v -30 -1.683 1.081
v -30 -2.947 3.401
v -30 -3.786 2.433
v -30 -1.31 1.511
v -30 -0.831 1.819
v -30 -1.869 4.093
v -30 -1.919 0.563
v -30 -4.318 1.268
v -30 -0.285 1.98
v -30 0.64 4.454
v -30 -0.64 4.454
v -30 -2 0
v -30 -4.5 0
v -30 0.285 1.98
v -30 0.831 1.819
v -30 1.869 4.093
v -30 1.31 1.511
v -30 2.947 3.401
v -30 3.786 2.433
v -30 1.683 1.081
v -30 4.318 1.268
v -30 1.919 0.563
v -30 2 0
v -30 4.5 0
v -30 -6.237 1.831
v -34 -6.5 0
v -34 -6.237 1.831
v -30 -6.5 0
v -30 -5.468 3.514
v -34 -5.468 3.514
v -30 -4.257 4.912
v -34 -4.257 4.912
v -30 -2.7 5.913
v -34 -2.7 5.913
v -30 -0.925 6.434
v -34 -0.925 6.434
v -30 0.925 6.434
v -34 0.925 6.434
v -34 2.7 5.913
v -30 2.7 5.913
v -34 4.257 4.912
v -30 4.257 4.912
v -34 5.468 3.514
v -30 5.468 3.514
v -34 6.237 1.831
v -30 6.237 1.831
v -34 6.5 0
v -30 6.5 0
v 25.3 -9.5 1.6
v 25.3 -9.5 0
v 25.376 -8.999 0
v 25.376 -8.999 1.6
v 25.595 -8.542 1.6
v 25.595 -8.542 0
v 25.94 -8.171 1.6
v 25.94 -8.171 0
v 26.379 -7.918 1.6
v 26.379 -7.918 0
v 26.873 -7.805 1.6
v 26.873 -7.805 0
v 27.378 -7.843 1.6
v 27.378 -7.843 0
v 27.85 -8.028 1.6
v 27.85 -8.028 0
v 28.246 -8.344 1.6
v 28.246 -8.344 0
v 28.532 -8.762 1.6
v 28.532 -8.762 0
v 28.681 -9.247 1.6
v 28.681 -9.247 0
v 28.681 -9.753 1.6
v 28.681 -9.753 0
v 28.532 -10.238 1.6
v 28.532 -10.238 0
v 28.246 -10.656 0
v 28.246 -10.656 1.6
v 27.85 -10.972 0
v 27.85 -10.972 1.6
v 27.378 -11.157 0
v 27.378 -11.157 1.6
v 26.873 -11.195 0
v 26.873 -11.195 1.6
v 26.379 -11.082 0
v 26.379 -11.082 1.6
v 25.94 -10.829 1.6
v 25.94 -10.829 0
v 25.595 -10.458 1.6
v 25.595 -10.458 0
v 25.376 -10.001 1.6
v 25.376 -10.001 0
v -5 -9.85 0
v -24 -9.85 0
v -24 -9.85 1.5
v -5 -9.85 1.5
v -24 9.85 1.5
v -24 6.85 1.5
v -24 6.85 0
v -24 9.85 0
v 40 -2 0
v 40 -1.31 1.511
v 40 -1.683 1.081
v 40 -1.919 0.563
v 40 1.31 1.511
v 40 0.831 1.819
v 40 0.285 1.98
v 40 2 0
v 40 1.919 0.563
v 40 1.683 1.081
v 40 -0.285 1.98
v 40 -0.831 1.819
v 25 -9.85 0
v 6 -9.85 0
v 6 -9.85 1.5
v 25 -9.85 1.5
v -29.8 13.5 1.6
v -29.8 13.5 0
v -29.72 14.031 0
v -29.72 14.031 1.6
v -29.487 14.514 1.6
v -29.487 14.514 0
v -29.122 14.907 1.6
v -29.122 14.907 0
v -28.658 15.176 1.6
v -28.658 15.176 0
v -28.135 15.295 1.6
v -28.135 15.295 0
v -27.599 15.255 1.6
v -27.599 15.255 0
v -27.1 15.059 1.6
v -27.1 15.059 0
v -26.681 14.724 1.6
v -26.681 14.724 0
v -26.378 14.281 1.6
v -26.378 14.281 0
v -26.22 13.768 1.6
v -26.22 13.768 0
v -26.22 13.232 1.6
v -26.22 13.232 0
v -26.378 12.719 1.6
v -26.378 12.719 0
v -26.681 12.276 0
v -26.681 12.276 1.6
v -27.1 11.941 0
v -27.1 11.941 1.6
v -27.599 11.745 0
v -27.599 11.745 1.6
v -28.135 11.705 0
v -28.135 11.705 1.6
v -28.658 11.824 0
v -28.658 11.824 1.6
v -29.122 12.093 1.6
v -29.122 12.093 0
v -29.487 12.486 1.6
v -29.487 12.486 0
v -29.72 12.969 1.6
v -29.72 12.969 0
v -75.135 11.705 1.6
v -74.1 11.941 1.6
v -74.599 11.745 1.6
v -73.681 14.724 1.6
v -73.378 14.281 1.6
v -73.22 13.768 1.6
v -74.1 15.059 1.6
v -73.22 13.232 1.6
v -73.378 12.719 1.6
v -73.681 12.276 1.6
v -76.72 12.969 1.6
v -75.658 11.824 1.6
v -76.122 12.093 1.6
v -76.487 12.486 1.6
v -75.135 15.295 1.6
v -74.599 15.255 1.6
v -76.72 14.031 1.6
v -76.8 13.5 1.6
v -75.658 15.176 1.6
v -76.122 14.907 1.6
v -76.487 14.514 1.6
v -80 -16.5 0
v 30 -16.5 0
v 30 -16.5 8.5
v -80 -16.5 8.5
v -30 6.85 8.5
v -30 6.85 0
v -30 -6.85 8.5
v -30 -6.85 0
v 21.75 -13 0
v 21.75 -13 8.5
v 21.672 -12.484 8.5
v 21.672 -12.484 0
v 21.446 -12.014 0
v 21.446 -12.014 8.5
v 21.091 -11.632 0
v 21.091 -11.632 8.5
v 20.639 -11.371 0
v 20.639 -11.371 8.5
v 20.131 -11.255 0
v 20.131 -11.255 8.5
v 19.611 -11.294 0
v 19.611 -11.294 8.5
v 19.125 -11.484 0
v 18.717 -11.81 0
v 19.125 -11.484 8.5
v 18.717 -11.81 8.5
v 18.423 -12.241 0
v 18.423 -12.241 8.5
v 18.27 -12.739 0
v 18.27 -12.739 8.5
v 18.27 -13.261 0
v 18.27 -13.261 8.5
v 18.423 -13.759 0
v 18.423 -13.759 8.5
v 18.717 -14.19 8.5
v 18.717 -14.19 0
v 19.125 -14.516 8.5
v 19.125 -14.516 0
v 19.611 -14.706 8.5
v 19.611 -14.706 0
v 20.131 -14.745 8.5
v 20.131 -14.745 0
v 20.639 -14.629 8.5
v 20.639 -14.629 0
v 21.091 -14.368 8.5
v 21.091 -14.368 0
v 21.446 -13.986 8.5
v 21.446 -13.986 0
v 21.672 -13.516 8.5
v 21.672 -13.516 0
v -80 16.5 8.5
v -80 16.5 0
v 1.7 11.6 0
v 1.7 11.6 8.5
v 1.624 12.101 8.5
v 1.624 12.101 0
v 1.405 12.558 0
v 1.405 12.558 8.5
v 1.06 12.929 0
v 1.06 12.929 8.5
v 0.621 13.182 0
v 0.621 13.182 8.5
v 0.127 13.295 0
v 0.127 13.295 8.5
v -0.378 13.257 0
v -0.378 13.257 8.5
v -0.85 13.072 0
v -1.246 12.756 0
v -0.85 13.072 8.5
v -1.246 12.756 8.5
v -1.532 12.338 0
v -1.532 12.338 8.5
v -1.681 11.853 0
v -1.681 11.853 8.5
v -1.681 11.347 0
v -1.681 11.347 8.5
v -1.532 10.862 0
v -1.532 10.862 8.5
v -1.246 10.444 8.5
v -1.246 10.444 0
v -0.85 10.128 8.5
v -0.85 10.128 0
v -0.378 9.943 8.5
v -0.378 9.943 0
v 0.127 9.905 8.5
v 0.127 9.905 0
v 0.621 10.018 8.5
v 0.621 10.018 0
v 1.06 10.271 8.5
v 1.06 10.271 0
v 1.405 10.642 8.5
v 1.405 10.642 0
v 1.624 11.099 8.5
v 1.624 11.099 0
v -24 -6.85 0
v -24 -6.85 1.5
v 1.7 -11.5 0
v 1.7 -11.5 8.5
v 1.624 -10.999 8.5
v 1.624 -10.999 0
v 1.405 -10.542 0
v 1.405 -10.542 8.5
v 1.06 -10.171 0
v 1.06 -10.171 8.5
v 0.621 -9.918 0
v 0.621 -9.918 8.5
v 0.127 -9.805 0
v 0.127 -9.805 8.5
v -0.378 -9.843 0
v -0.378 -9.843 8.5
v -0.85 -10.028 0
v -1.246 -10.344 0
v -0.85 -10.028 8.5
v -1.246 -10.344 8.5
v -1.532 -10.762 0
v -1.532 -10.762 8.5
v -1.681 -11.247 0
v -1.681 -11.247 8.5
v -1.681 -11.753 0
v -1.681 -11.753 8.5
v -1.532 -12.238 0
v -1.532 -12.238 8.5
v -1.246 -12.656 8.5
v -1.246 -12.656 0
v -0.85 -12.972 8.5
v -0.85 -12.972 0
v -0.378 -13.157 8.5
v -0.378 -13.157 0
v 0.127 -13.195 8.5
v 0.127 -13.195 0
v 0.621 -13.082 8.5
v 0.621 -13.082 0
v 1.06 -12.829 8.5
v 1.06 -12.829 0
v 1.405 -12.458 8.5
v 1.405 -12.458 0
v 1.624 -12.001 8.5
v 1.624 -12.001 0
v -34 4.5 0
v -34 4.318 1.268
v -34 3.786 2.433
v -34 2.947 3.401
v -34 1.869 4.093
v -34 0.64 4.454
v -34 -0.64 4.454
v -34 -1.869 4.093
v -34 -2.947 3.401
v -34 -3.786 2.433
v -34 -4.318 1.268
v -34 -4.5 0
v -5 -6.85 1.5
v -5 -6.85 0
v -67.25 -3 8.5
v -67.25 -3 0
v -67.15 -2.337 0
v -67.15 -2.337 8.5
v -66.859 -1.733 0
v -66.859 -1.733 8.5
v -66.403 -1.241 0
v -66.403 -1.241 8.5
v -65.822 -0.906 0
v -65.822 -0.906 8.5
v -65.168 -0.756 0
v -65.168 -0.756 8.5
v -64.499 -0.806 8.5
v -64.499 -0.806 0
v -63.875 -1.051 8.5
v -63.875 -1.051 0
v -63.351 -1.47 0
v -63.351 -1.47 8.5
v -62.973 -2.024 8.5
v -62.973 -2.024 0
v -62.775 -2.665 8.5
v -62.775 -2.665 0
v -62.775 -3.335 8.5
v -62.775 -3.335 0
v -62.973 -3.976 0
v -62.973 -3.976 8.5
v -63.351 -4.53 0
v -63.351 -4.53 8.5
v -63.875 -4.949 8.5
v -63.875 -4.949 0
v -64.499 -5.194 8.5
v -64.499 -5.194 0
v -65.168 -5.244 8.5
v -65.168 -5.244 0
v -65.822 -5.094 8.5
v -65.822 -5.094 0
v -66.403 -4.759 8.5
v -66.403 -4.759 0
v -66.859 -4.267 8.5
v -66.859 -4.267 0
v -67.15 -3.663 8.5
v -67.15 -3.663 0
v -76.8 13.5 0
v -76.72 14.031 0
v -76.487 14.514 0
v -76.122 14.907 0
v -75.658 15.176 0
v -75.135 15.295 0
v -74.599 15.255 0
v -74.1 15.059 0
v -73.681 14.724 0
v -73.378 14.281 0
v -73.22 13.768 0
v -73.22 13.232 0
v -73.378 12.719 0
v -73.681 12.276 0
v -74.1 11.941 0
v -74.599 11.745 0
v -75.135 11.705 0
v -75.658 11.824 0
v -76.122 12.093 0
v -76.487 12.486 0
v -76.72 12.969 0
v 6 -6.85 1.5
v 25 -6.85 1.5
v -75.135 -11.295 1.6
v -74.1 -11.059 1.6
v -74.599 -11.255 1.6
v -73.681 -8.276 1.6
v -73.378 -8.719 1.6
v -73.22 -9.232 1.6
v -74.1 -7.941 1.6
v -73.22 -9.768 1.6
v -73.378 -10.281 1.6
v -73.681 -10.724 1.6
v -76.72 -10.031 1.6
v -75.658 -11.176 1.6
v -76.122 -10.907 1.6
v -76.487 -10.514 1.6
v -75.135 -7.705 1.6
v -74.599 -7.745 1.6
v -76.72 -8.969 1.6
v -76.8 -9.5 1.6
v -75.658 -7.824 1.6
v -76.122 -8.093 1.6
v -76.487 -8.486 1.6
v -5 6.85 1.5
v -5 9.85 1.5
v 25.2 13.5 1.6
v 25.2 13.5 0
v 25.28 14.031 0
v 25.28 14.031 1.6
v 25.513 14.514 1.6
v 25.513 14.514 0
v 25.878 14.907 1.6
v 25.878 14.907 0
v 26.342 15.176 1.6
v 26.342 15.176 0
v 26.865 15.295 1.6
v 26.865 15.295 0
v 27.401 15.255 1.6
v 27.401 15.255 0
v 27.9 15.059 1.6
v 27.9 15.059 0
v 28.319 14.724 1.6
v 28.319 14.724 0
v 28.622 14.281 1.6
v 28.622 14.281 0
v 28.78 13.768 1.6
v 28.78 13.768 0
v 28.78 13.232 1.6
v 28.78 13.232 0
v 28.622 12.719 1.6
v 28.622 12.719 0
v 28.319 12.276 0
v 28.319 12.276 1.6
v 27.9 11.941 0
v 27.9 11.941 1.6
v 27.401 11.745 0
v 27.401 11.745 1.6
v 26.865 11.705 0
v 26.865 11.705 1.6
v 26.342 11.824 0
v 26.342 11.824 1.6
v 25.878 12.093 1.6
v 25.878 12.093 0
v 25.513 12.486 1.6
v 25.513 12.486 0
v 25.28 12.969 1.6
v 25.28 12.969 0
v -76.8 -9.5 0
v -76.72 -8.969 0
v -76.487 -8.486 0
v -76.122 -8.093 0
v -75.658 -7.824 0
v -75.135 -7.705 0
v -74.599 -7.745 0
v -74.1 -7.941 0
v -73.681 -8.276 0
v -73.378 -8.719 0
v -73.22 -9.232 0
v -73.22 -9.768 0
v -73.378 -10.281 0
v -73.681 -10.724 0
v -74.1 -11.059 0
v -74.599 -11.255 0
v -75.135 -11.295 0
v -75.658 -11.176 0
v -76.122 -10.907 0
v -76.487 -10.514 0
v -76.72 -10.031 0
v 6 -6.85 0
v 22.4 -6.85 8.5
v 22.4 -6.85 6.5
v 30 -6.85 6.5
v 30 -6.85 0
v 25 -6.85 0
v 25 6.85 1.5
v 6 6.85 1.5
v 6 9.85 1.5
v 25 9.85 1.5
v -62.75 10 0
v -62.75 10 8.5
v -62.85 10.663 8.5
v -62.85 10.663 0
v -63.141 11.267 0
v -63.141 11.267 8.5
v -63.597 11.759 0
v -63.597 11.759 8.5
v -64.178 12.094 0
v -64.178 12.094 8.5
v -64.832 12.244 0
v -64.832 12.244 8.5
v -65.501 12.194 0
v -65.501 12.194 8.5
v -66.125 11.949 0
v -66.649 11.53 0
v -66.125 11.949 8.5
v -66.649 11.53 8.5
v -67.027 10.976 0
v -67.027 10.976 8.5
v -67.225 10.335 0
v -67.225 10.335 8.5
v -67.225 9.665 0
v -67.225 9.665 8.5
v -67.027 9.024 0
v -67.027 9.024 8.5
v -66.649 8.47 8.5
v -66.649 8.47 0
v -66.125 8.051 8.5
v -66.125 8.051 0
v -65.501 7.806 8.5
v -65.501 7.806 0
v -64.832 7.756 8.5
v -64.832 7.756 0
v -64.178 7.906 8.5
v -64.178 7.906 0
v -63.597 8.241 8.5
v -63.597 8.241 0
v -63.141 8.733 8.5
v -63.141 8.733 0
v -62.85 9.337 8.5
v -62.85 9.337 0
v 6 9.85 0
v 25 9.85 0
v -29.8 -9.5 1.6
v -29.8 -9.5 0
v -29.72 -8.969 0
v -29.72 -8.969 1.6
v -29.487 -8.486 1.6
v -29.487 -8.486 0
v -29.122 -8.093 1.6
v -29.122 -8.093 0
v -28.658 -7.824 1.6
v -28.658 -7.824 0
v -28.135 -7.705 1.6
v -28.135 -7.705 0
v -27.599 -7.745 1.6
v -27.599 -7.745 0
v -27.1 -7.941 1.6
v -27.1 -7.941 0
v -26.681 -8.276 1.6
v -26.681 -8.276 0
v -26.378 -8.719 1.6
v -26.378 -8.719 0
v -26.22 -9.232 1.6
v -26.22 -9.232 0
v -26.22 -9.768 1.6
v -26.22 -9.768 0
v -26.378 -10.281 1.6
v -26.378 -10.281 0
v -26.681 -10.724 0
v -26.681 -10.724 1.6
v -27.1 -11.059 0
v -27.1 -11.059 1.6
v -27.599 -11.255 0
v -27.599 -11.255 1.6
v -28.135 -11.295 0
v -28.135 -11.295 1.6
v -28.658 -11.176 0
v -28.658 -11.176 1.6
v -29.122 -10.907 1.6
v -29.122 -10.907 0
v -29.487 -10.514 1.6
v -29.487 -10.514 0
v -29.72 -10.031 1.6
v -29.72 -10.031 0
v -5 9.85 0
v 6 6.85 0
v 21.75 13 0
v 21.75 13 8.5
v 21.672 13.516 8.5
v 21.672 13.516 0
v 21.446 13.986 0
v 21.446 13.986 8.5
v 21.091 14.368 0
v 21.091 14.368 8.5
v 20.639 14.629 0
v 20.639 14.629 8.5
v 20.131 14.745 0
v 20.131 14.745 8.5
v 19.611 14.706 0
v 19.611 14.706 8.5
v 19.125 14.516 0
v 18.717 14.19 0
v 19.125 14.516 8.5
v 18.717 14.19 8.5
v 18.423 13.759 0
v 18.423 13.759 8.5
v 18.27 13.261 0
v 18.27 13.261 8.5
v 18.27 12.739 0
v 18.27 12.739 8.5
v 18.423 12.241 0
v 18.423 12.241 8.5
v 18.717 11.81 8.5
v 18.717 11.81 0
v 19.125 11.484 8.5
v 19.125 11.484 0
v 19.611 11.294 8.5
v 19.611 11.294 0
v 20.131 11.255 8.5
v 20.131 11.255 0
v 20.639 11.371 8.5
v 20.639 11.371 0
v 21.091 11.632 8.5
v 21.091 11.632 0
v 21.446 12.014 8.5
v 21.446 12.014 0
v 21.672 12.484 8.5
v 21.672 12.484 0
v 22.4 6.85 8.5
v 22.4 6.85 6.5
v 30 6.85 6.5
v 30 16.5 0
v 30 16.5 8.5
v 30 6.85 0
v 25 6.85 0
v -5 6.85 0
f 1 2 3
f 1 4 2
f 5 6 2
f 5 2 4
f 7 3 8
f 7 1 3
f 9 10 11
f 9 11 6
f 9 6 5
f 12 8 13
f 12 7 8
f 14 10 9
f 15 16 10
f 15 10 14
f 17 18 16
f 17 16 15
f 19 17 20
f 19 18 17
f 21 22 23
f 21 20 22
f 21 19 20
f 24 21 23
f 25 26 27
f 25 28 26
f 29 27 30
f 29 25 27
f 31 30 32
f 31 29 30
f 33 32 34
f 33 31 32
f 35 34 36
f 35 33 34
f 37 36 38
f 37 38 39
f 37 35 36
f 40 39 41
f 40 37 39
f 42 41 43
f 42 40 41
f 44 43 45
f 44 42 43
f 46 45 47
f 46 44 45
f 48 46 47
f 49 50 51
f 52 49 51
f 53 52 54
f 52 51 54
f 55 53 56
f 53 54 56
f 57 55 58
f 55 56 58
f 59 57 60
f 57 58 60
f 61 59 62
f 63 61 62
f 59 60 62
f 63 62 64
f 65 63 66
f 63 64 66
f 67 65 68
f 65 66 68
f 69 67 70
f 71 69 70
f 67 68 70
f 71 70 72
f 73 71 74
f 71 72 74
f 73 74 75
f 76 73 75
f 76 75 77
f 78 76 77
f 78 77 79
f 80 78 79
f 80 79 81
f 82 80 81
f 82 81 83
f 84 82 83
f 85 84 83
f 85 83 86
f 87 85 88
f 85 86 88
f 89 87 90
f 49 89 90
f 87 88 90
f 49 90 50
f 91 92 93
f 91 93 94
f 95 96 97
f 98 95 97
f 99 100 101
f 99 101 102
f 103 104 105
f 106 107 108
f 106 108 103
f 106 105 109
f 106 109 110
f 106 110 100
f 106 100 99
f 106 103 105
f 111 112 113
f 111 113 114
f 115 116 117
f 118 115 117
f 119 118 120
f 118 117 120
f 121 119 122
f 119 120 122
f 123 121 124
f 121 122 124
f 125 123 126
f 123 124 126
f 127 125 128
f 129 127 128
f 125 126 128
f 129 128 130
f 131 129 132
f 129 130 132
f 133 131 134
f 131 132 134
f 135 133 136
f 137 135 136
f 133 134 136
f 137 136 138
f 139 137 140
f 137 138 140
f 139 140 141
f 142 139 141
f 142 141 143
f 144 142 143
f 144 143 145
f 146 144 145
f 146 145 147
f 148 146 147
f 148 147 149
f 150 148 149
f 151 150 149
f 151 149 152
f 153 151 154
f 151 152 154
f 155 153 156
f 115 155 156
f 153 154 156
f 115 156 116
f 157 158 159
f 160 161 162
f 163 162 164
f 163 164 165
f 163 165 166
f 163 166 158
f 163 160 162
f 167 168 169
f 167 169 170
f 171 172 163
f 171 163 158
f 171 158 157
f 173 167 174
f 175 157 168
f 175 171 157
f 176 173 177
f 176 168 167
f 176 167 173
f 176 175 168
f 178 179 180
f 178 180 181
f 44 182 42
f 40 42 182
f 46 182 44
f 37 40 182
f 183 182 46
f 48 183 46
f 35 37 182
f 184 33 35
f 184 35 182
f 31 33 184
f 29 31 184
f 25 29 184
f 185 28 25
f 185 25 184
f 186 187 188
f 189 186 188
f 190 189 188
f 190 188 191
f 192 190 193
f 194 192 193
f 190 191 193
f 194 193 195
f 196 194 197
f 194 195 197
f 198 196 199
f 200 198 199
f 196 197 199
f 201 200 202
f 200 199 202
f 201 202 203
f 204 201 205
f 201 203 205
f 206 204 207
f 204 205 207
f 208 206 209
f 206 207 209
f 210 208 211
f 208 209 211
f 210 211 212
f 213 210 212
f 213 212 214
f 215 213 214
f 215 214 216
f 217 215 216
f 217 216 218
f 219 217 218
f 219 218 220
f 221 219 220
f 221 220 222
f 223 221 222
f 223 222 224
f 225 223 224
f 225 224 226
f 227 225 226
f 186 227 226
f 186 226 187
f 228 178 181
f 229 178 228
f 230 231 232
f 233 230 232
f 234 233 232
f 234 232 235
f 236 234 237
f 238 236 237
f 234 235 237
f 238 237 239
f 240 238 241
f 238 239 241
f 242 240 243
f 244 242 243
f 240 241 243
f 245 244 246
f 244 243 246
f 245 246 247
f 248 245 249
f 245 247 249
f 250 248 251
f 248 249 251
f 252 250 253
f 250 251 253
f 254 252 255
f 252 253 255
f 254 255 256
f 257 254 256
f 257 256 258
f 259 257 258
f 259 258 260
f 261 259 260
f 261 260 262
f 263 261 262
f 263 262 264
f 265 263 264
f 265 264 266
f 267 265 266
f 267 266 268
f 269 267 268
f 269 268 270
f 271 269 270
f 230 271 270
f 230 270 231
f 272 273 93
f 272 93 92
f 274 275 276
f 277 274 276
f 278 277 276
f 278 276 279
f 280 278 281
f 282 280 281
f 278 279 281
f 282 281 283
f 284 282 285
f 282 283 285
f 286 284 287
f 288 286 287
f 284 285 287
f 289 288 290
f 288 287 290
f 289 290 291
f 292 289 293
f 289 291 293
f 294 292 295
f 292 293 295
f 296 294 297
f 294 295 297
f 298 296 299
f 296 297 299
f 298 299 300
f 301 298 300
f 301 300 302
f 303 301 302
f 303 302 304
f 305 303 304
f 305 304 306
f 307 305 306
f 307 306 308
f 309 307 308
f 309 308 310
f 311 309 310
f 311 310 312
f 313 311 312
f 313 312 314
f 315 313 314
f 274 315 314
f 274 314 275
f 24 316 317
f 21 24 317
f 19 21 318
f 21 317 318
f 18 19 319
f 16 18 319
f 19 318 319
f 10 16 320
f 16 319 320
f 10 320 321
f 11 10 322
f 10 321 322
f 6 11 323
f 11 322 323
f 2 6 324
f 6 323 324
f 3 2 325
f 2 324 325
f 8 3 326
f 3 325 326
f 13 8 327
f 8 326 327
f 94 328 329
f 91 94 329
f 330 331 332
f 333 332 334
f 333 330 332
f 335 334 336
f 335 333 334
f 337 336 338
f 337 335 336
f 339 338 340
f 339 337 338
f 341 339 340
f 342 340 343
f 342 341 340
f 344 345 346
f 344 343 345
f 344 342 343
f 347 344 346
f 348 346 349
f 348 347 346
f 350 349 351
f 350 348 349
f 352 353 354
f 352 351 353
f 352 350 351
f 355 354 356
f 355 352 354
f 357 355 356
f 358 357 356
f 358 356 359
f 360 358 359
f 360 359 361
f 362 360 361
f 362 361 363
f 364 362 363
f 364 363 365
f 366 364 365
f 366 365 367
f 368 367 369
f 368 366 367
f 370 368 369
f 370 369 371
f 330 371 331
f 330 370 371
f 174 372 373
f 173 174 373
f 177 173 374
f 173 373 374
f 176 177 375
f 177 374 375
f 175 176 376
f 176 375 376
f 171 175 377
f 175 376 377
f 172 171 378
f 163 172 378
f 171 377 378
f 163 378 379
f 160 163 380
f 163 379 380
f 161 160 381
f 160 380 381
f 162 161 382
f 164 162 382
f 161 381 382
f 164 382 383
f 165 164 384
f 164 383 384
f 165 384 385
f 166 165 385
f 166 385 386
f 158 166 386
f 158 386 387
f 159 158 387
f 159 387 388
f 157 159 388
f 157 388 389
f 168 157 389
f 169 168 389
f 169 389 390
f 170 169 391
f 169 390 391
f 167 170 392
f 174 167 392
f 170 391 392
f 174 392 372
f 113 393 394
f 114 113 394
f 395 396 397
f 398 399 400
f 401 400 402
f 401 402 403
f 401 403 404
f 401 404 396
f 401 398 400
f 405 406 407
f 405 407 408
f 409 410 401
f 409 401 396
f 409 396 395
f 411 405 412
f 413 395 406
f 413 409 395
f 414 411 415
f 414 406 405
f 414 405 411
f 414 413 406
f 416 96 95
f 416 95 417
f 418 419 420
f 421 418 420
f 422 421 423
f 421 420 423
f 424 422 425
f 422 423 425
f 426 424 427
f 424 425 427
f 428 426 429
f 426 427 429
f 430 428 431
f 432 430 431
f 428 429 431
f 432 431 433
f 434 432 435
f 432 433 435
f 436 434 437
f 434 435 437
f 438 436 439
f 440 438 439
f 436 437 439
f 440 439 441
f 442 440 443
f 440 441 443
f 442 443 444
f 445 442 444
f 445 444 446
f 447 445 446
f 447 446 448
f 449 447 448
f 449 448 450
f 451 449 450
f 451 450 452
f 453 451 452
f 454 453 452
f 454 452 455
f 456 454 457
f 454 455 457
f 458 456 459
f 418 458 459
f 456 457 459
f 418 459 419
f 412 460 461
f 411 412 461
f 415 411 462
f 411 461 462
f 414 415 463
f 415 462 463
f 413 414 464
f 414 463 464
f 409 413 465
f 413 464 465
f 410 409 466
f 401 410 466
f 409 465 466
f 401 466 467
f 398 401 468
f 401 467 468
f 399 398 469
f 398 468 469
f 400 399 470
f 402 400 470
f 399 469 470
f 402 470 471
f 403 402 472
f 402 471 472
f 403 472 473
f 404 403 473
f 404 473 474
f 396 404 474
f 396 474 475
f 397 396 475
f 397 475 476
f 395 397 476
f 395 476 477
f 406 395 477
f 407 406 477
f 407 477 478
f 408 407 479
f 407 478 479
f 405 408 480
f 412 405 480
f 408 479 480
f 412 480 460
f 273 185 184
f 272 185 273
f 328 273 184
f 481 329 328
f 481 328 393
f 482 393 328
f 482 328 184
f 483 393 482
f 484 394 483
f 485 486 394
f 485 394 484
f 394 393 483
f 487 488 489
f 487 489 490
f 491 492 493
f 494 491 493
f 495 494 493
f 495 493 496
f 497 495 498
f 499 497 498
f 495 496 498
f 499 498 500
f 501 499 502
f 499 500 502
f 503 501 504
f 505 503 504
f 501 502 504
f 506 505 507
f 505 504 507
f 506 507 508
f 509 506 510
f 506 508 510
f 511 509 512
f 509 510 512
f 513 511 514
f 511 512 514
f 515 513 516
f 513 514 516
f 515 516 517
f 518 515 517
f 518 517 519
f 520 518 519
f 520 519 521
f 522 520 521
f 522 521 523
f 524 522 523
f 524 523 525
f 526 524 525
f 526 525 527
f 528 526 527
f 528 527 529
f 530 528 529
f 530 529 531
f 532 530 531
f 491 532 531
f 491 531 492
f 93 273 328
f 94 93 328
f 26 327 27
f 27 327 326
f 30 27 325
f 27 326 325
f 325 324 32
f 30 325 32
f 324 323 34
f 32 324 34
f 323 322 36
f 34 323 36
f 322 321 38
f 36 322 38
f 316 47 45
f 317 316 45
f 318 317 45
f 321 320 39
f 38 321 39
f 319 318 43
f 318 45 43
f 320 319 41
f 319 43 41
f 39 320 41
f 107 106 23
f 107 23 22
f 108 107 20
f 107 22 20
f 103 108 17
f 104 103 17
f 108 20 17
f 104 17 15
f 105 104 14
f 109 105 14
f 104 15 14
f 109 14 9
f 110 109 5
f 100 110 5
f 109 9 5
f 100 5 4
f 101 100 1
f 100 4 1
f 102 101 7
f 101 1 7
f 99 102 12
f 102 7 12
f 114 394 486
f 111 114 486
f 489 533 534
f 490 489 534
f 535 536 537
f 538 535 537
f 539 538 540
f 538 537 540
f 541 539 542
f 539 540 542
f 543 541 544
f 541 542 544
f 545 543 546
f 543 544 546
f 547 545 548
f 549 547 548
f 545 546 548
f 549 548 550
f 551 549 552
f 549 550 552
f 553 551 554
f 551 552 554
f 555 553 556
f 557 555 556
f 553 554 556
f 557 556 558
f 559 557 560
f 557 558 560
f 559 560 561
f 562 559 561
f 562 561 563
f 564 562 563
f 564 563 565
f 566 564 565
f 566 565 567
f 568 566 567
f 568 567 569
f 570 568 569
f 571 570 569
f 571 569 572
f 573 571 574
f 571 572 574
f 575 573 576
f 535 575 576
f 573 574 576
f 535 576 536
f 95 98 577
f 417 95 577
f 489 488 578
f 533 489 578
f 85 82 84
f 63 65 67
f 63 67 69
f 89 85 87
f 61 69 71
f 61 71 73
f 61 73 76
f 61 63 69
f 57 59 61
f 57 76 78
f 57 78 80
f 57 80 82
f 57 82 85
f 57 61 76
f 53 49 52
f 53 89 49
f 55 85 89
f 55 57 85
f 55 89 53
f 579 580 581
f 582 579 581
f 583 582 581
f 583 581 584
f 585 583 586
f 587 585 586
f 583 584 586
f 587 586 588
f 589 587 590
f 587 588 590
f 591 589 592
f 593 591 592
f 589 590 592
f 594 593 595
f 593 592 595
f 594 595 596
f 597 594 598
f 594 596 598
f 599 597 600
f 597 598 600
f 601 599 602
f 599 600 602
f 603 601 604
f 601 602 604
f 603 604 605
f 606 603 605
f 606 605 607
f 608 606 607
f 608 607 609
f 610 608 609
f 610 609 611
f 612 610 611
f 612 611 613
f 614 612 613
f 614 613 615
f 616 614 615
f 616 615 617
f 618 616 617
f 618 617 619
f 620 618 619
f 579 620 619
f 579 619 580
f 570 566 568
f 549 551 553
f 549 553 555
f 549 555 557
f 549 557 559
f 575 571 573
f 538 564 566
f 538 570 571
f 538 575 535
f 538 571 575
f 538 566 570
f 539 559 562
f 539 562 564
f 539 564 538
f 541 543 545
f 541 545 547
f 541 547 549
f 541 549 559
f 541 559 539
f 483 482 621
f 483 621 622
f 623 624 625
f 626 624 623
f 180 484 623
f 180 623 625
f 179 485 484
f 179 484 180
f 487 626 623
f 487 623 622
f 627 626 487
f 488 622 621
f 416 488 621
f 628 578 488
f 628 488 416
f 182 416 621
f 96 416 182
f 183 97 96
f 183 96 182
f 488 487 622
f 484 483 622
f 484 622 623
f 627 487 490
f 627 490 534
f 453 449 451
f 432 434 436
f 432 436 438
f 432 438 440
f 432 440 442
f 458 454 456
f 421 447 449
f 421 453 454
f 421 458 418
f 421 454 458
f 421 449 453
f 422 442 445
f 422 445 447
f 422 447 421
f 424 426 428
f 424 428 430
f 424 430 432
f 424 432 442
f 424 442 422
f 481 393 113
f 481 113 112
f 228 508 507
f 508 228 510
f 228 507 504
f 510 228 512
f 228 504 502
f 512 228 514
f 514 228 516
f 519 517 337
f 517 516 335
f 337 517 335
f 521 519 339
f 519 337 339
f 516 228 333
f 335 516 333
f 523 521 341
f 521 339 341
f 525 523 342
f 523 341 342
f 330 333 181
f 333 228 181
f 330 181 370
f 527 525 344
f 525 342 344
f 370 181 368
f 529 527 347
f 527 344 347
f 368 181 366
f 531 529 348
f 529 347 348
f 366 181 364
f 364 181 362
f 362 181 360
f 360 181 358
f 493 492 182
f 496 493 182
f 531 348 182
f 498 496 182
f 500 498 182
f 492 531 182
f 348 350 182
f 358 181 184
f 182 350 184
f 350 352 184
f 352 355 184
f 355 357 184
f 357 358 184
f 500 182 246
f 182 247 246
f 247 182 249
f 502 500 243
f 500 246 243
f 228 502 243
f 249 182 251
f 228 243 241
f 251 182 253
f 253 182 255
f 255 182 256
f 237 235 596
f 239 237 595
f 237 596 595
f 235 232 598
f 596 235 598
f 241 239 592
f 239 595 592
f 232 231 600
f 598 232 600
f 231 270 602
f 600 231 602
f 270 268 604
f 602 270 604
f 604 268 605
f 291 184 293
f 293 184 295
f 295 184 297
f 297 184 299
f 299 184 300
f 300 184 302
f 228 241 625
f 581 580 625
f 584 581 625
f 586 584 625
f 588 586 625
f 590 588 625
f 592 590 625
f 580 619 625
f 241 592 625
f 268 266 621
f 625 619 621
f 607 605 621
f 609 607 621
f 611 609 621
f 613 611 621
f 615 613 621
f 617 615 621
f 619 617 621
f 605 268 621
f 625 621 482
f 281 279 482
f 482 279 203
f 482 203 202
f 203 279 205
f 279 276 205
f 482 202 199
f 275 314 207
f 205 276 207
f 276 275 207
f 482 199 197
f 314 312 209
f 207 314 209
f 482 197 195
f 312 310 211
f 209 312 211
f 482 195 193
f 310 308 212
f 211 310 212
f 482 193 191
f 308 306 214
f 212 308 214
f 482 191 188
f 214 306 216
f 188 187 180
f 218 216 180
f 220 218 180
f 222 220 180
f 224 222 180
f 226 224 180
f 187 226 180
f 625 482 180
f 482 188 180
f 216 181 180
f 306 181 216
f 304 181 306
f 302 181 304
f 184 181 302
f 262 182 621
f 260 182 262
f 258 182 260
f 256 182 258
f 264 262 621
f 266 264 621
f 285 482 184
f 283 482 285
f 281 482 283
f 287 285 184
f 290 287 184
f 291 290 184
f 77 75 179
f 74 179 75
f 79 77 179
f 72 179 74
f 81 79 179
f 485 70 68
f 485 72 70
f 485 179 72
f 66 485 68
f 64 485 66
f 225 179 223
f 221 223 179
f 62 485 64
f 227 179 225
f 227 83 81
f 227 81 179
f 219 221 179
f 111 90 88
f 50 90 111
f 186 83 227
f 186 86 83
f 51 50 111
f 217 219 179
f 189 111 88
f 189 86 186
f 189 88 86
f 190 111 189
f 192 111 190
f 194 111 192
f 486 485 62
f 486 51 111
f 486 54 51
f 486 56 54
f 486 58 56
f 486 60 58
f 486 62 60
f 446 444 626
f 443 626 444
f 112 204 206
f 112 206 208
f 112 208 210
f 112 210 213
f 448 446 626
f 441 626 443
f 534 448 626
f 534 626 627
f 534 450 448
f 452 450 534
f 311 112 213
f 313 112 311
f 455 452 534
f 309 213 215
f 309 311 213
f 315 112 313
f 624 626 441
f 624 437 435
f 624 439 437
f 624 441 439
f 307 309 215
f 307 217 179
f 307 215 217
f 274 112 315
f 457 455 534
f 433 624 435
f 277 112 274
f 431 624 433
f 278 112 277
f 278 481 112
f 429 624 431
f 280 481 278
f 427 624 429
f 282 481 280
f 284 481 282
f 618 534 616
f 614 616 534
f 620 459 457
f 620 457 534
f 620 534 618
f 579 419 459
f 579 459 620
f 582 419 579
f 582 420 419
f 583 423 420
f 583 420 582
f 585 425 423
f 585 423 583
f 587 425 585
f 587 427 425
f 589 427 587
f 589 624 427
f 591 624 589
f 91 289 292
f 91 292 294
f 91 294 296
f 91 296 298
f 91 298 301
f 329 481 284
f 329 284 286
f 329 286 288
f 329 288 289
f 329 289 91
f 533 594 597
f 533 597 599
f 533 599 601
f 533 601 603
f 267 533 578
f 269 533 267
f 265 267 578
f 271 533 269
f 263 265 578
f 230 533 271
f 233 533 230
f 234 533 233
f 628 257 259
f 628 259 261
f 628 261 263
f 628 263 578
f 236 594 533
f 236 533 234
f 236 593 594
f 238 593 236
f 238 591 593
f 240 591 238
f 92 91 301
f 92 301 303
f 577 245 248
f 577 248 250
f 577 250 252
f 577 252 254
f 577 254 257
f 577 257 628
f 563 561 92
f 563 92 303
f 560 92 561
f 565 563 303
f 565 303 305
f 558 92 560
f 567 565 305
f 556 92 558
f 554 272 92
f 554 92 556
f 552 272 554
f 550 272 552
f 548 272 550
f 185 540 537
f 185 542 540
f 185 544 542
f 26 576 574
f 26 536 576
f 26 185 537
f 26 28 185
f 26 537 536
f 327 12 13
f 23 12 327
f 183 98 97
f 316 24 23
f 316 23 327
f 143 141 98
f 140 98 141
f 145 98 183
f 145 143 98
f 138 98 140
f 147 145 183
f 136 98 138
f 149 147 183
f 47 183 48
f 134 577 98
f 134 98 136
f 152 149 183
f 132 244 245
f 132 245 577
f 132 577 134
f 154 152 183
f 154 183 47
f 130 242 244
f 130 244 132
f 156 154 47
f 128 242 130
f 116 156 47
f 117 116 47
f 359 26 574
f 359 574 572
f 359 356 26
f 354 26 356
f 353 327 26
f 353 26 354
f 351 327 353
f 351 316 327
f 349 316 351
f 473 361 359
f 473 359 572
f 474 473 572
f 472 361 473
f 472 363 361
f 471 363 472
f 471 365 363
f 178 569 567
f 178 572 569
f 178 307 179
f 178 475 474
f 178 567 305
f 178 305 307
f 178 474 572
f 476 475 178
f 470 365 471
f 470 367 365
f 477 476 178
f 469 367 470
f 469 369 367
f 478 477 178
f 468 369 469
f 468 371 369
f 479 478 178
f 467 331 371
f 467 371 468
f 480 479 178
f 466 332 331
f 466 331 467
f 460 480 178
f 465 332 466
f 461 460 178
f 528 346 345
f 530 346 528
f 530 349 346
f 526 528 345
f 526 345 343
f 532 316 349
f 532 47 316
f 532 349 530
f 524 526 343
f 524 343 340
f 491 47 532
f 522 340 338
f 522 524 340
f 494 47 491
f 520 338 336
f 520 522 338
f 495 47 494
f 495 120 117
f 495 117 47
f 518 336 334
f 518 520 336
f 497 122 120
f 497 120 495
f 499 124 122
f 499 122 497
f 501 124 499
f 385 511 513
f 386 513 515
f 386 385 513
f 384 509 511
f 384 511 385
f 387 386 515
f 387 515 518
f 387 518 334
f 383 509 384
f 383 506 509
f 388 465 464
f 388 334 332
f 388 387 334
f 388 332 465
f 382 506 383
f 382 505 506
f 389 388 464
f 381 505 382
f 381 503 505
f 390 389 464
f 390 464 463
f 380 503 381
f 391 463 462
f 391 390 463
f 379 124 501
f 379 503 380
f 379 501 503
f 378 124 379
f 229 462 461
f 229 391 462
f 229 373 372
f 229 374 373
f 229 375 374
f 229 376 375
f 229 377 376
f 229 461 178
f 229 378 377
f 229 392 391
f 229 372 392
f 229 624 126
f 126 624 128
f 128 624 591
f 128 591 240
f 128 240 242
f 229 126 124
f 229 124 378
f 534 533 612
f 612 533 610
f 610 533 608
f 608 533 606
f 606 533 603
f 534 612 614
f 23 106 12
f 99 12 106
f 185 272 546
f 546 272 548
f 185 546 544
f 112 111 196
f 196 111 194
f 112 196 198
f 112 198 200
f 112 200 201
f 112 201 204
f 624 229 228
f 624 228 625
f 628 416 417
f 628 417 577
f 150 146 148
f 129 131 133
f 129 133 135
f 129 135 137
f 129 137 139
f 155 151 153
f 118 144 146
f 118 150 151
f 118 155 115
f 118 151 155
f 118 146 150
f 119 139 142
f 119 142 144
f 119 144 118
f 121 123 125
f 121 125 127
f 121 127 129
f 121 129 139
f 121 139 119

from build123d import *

# Parameters (mm, degrees)
RESSALTO_EXTRUS_O1_DEPTH        = 8.5
ESBO_O8_W                       = 19
ESBO_O8_H                       = 1.5
CORTE_EXTRUS_O1_DEPTH           = 3
ESBO_O5_W                       = 19
ESBO_O5_H                       = 1.5
CORTE_EXTRUS_O2_DEPTH           = 3
ESBO_O11_R                      = 2.25
CORTE_EXTRUS_O6_DEPTH           = 9.5
ESBO_O12_R                      = 2.25
CORTE_EXTRUS_O7_DEPTH           = 9.5
ESBO_O15_R                      = 6.5
CORTE_EXTRUS_O12_DEPTH          = 4
RESSALTO_EXTRUS_O2_DEPTH        = 4
ESBO_O17_R                      = 1.8
ESBO_O17_R_2                    = 1.7
CORTE_EXTRUS_O13_DEPTH          = 1.6
ESBO_O8_4_W                     = 19
ESBO_O8_4_H                     = 1.5
CORTE_EXTRUS_O14_DEPTH          = 3
ESBO_O11_7_R                    = 1.7
CORTE_EXTRUS_O18_DEPTH          = 9.5
RESSALTO_EXTRUS_O3_DEPTH        = 70
SKIZZE1_W                       = 7.6
SKIZZE1_H                       = 2
AUFSATZ_LINEAR_AUSTRAGEN1_DEPTH = 15
SKETCH1_R                       = 1.75
CUT_EXTRUDE1_DEPTH              = 10


with BuildPart() as part:
    # Esboço4 → Ressalto-extrusão1 (new body)
    with BuildSketch(Plane.XY):
        Polygon((-80, 16.5), (30, 16.5), (30, 6.85), (-30, 6.85), (-30, -6.85), (30, -6.85), (30, -16.5), (-80, -16.5), align=None)
    extrude(amount=RESSALTO_EXTRUS_O1_DEPTH)

    # Esboço8 → Corte-extrusão1 (cut)
    with BuildSketch(Plane(origin=(-30, -6.85, 8.5), x_dir=(1, 0, 0), z_dir=(0, 1, 0))):
        with Locations((15.5, 7.75)):
            Rectangle(ESBO_O8_W, ESBO_O8_H)
    extrude(amount=-CORTE_EXTRUS_O1_DEPTH, mode=Mode.SUBTRACT)

    # Esboço5 → Corte-extrusão2 (cut)
    with BuildSketch(Plane(origin=(-30, 6.85, 8.5), x_dir=(1, 0, 0), z_dir=(0, 1, 0))):
        with Locations((15.5, 7.75)):
            Rectangle(ESBO_O5_W, ESBO_O5_H)
        with Locations((45.5, 7.75)):
            Rectangle(ESBO_O5_W, ESBO_O5_H)
    extrude(amount=CORTE_EXTRUS_O2_DEPTH, mode=Mode.SUBTRACT)

    # Esboço11 → Corte-extrusão6 (cut, through all)
    with BuildSketch(Plane.XY.offset(8.5)):
        with Locations((-65, 10)):
            Circle(ESBO_O11_R)
    extrude(amount=-CORTE_EXTRUS_O6_DEPTH, mode=Mode.SUBTRACT)

    # Esboço12 → Corte-extrusão7 (cut, through all)
    with BuildSketch(Plane(origin=(-80, 16.5, 8.5), x_dir=(-1, 0, 0), z_dir=(0, 0, -1))):
        with Locations((-15, -19.5)):
            Circle(ESBO_O12_R)
    extrude(amount=CORTE_EXTRUS_O7_DEPTH, mode=Mode.SUBTRACT)

    # Esboço15 → Corte-extrusão12 (cut)
    with BuildSketch(Plane(origin=(-30, -6.85, 0), x_dir=(0, 0, 1), z_dir=(-1, 0, 0))):
        with Locations((0, 6.85)):
            Circle(ESBO_O15_R)
    extrude(amount=CORTE_EXTRUS_O12_DEPTH, mode=Mode.SUBTRACT)

    # Esboço16 → Ressalto-extrusão2 (add)
    with BuildSketch(Plane(origin=(-34, -6.5, 0), x_dir=(0, 0, -1), z_dir=(1, 0, 0))):
        with BuildLine():
            Line((0, 2), (0, 11))
            ThreePointArc((0, 11), (-4.5, 6.5), (0, 2))
        make_face()
    extrude(amount=RESSALTO_EXTRUS_O2_DEPTH)

    # Esboço17 → Corte-extrusão13 (cut)
    with BuildSketch(Plane(origin=(-80, 16.5, 0), x_dir=(-1, 0, 0), z_dir=(0, 0, -1))):
        with Locations((-5, -3)):
            Circle(ESBO_O17_R)
        with Locations((-5, -26)):
            Circle(ESBO_O17_R)
        with Locations((-52, -26)):
            Circle(ESBO_O17_R)
        with Locations((-52, -3)):
            Circle(ESBO_O17_R)
        with Locations((-107, -26)):
            Circle(ESBO_O17_R_2)
        with Locations((-107, -3)):
            Circle(ESBO_O17_R)
    extrude(amount=-CORTE_EXTRUS_O13_DEPTH, mode=Mode.SUBTRACT)

    # Esboço8<4> → Corte-extrusão14 (cut)
    with BuildSketch(Plane(origin=(-30, -6.85, 8.5), x_dir=(1, 0, 0), z_dir=(0, 1, 0))):
        with Locations((15.5, 7.75)):
            Rectangle(ESBO_O8_4_W, ESBO_O8_4_H)
        with Locations((45.5, 7.75)):
            Rectangle(ESBO_O8_4_W, ESBO_O8_4_H)
    extrude(amount=-CORTE_EXTRUS_O14_DEPTH, mode=Mode.SUBTRACT)

    # Esboço11<7> → Corte-extrusão18 (cut, through all)
    with BuildSketch(Plane.XY.offset(8.5)):
        with Locations((0, -11.5)):
            Circle(ESBO_O11_7_R)
        with Locations((0, 11.6)):
            Circle(ESBO_O11_7_R)
    extrude(amount=-CORTE_EXTRUS_O18_DEPTH, mode=Mode.SUBTRACT)

    # Esboço18 → Ressalto-extrusão3 (add)
    with BuildSketch(Plane(origin=(-30, -4.5, 0), x_dir=(0, 0, 1), z_dir=(-1, 0, 0))):
        with BuildLine():
            Line((0, 2.5), (0, 6.5))
            ThreePointArc((0, 6.5), (2, 4.5), (0, 2.5))
        make_face()
    extrude(amount=-RESSALTO_EXTRUS_O3_DEPTH)

    # Skizze1 → Aufsatz-Linear austragen1 (add)
    with BuildSketch(Plane(origin=(0, -6.85, 0), x_dir=(1, 0, 0), z_dir=(0, 1, 0))):
        with Locations((26.2, -7.5)):
            Rectangle(SKIZZE1_W, SKIZZE1_H)
    extrude(amount=AUFSATZ_LINEAR_AUSTRAGEN1_DEPTH)

    # Sketch1 → Cut-Extrude1 (cut)
    with BuildSketch(Plane.XY.offset(8.5)):
        with Locations((20, 13)):
            Circle(SKETCH1_R)
        with Locations((20, -13)):
            Circle(SKETCH1_R)
    extrude(amount=-CUT_EXTRUDE1_DEPTH, mode=Mode.SUBTRACT)


solid = part.part
